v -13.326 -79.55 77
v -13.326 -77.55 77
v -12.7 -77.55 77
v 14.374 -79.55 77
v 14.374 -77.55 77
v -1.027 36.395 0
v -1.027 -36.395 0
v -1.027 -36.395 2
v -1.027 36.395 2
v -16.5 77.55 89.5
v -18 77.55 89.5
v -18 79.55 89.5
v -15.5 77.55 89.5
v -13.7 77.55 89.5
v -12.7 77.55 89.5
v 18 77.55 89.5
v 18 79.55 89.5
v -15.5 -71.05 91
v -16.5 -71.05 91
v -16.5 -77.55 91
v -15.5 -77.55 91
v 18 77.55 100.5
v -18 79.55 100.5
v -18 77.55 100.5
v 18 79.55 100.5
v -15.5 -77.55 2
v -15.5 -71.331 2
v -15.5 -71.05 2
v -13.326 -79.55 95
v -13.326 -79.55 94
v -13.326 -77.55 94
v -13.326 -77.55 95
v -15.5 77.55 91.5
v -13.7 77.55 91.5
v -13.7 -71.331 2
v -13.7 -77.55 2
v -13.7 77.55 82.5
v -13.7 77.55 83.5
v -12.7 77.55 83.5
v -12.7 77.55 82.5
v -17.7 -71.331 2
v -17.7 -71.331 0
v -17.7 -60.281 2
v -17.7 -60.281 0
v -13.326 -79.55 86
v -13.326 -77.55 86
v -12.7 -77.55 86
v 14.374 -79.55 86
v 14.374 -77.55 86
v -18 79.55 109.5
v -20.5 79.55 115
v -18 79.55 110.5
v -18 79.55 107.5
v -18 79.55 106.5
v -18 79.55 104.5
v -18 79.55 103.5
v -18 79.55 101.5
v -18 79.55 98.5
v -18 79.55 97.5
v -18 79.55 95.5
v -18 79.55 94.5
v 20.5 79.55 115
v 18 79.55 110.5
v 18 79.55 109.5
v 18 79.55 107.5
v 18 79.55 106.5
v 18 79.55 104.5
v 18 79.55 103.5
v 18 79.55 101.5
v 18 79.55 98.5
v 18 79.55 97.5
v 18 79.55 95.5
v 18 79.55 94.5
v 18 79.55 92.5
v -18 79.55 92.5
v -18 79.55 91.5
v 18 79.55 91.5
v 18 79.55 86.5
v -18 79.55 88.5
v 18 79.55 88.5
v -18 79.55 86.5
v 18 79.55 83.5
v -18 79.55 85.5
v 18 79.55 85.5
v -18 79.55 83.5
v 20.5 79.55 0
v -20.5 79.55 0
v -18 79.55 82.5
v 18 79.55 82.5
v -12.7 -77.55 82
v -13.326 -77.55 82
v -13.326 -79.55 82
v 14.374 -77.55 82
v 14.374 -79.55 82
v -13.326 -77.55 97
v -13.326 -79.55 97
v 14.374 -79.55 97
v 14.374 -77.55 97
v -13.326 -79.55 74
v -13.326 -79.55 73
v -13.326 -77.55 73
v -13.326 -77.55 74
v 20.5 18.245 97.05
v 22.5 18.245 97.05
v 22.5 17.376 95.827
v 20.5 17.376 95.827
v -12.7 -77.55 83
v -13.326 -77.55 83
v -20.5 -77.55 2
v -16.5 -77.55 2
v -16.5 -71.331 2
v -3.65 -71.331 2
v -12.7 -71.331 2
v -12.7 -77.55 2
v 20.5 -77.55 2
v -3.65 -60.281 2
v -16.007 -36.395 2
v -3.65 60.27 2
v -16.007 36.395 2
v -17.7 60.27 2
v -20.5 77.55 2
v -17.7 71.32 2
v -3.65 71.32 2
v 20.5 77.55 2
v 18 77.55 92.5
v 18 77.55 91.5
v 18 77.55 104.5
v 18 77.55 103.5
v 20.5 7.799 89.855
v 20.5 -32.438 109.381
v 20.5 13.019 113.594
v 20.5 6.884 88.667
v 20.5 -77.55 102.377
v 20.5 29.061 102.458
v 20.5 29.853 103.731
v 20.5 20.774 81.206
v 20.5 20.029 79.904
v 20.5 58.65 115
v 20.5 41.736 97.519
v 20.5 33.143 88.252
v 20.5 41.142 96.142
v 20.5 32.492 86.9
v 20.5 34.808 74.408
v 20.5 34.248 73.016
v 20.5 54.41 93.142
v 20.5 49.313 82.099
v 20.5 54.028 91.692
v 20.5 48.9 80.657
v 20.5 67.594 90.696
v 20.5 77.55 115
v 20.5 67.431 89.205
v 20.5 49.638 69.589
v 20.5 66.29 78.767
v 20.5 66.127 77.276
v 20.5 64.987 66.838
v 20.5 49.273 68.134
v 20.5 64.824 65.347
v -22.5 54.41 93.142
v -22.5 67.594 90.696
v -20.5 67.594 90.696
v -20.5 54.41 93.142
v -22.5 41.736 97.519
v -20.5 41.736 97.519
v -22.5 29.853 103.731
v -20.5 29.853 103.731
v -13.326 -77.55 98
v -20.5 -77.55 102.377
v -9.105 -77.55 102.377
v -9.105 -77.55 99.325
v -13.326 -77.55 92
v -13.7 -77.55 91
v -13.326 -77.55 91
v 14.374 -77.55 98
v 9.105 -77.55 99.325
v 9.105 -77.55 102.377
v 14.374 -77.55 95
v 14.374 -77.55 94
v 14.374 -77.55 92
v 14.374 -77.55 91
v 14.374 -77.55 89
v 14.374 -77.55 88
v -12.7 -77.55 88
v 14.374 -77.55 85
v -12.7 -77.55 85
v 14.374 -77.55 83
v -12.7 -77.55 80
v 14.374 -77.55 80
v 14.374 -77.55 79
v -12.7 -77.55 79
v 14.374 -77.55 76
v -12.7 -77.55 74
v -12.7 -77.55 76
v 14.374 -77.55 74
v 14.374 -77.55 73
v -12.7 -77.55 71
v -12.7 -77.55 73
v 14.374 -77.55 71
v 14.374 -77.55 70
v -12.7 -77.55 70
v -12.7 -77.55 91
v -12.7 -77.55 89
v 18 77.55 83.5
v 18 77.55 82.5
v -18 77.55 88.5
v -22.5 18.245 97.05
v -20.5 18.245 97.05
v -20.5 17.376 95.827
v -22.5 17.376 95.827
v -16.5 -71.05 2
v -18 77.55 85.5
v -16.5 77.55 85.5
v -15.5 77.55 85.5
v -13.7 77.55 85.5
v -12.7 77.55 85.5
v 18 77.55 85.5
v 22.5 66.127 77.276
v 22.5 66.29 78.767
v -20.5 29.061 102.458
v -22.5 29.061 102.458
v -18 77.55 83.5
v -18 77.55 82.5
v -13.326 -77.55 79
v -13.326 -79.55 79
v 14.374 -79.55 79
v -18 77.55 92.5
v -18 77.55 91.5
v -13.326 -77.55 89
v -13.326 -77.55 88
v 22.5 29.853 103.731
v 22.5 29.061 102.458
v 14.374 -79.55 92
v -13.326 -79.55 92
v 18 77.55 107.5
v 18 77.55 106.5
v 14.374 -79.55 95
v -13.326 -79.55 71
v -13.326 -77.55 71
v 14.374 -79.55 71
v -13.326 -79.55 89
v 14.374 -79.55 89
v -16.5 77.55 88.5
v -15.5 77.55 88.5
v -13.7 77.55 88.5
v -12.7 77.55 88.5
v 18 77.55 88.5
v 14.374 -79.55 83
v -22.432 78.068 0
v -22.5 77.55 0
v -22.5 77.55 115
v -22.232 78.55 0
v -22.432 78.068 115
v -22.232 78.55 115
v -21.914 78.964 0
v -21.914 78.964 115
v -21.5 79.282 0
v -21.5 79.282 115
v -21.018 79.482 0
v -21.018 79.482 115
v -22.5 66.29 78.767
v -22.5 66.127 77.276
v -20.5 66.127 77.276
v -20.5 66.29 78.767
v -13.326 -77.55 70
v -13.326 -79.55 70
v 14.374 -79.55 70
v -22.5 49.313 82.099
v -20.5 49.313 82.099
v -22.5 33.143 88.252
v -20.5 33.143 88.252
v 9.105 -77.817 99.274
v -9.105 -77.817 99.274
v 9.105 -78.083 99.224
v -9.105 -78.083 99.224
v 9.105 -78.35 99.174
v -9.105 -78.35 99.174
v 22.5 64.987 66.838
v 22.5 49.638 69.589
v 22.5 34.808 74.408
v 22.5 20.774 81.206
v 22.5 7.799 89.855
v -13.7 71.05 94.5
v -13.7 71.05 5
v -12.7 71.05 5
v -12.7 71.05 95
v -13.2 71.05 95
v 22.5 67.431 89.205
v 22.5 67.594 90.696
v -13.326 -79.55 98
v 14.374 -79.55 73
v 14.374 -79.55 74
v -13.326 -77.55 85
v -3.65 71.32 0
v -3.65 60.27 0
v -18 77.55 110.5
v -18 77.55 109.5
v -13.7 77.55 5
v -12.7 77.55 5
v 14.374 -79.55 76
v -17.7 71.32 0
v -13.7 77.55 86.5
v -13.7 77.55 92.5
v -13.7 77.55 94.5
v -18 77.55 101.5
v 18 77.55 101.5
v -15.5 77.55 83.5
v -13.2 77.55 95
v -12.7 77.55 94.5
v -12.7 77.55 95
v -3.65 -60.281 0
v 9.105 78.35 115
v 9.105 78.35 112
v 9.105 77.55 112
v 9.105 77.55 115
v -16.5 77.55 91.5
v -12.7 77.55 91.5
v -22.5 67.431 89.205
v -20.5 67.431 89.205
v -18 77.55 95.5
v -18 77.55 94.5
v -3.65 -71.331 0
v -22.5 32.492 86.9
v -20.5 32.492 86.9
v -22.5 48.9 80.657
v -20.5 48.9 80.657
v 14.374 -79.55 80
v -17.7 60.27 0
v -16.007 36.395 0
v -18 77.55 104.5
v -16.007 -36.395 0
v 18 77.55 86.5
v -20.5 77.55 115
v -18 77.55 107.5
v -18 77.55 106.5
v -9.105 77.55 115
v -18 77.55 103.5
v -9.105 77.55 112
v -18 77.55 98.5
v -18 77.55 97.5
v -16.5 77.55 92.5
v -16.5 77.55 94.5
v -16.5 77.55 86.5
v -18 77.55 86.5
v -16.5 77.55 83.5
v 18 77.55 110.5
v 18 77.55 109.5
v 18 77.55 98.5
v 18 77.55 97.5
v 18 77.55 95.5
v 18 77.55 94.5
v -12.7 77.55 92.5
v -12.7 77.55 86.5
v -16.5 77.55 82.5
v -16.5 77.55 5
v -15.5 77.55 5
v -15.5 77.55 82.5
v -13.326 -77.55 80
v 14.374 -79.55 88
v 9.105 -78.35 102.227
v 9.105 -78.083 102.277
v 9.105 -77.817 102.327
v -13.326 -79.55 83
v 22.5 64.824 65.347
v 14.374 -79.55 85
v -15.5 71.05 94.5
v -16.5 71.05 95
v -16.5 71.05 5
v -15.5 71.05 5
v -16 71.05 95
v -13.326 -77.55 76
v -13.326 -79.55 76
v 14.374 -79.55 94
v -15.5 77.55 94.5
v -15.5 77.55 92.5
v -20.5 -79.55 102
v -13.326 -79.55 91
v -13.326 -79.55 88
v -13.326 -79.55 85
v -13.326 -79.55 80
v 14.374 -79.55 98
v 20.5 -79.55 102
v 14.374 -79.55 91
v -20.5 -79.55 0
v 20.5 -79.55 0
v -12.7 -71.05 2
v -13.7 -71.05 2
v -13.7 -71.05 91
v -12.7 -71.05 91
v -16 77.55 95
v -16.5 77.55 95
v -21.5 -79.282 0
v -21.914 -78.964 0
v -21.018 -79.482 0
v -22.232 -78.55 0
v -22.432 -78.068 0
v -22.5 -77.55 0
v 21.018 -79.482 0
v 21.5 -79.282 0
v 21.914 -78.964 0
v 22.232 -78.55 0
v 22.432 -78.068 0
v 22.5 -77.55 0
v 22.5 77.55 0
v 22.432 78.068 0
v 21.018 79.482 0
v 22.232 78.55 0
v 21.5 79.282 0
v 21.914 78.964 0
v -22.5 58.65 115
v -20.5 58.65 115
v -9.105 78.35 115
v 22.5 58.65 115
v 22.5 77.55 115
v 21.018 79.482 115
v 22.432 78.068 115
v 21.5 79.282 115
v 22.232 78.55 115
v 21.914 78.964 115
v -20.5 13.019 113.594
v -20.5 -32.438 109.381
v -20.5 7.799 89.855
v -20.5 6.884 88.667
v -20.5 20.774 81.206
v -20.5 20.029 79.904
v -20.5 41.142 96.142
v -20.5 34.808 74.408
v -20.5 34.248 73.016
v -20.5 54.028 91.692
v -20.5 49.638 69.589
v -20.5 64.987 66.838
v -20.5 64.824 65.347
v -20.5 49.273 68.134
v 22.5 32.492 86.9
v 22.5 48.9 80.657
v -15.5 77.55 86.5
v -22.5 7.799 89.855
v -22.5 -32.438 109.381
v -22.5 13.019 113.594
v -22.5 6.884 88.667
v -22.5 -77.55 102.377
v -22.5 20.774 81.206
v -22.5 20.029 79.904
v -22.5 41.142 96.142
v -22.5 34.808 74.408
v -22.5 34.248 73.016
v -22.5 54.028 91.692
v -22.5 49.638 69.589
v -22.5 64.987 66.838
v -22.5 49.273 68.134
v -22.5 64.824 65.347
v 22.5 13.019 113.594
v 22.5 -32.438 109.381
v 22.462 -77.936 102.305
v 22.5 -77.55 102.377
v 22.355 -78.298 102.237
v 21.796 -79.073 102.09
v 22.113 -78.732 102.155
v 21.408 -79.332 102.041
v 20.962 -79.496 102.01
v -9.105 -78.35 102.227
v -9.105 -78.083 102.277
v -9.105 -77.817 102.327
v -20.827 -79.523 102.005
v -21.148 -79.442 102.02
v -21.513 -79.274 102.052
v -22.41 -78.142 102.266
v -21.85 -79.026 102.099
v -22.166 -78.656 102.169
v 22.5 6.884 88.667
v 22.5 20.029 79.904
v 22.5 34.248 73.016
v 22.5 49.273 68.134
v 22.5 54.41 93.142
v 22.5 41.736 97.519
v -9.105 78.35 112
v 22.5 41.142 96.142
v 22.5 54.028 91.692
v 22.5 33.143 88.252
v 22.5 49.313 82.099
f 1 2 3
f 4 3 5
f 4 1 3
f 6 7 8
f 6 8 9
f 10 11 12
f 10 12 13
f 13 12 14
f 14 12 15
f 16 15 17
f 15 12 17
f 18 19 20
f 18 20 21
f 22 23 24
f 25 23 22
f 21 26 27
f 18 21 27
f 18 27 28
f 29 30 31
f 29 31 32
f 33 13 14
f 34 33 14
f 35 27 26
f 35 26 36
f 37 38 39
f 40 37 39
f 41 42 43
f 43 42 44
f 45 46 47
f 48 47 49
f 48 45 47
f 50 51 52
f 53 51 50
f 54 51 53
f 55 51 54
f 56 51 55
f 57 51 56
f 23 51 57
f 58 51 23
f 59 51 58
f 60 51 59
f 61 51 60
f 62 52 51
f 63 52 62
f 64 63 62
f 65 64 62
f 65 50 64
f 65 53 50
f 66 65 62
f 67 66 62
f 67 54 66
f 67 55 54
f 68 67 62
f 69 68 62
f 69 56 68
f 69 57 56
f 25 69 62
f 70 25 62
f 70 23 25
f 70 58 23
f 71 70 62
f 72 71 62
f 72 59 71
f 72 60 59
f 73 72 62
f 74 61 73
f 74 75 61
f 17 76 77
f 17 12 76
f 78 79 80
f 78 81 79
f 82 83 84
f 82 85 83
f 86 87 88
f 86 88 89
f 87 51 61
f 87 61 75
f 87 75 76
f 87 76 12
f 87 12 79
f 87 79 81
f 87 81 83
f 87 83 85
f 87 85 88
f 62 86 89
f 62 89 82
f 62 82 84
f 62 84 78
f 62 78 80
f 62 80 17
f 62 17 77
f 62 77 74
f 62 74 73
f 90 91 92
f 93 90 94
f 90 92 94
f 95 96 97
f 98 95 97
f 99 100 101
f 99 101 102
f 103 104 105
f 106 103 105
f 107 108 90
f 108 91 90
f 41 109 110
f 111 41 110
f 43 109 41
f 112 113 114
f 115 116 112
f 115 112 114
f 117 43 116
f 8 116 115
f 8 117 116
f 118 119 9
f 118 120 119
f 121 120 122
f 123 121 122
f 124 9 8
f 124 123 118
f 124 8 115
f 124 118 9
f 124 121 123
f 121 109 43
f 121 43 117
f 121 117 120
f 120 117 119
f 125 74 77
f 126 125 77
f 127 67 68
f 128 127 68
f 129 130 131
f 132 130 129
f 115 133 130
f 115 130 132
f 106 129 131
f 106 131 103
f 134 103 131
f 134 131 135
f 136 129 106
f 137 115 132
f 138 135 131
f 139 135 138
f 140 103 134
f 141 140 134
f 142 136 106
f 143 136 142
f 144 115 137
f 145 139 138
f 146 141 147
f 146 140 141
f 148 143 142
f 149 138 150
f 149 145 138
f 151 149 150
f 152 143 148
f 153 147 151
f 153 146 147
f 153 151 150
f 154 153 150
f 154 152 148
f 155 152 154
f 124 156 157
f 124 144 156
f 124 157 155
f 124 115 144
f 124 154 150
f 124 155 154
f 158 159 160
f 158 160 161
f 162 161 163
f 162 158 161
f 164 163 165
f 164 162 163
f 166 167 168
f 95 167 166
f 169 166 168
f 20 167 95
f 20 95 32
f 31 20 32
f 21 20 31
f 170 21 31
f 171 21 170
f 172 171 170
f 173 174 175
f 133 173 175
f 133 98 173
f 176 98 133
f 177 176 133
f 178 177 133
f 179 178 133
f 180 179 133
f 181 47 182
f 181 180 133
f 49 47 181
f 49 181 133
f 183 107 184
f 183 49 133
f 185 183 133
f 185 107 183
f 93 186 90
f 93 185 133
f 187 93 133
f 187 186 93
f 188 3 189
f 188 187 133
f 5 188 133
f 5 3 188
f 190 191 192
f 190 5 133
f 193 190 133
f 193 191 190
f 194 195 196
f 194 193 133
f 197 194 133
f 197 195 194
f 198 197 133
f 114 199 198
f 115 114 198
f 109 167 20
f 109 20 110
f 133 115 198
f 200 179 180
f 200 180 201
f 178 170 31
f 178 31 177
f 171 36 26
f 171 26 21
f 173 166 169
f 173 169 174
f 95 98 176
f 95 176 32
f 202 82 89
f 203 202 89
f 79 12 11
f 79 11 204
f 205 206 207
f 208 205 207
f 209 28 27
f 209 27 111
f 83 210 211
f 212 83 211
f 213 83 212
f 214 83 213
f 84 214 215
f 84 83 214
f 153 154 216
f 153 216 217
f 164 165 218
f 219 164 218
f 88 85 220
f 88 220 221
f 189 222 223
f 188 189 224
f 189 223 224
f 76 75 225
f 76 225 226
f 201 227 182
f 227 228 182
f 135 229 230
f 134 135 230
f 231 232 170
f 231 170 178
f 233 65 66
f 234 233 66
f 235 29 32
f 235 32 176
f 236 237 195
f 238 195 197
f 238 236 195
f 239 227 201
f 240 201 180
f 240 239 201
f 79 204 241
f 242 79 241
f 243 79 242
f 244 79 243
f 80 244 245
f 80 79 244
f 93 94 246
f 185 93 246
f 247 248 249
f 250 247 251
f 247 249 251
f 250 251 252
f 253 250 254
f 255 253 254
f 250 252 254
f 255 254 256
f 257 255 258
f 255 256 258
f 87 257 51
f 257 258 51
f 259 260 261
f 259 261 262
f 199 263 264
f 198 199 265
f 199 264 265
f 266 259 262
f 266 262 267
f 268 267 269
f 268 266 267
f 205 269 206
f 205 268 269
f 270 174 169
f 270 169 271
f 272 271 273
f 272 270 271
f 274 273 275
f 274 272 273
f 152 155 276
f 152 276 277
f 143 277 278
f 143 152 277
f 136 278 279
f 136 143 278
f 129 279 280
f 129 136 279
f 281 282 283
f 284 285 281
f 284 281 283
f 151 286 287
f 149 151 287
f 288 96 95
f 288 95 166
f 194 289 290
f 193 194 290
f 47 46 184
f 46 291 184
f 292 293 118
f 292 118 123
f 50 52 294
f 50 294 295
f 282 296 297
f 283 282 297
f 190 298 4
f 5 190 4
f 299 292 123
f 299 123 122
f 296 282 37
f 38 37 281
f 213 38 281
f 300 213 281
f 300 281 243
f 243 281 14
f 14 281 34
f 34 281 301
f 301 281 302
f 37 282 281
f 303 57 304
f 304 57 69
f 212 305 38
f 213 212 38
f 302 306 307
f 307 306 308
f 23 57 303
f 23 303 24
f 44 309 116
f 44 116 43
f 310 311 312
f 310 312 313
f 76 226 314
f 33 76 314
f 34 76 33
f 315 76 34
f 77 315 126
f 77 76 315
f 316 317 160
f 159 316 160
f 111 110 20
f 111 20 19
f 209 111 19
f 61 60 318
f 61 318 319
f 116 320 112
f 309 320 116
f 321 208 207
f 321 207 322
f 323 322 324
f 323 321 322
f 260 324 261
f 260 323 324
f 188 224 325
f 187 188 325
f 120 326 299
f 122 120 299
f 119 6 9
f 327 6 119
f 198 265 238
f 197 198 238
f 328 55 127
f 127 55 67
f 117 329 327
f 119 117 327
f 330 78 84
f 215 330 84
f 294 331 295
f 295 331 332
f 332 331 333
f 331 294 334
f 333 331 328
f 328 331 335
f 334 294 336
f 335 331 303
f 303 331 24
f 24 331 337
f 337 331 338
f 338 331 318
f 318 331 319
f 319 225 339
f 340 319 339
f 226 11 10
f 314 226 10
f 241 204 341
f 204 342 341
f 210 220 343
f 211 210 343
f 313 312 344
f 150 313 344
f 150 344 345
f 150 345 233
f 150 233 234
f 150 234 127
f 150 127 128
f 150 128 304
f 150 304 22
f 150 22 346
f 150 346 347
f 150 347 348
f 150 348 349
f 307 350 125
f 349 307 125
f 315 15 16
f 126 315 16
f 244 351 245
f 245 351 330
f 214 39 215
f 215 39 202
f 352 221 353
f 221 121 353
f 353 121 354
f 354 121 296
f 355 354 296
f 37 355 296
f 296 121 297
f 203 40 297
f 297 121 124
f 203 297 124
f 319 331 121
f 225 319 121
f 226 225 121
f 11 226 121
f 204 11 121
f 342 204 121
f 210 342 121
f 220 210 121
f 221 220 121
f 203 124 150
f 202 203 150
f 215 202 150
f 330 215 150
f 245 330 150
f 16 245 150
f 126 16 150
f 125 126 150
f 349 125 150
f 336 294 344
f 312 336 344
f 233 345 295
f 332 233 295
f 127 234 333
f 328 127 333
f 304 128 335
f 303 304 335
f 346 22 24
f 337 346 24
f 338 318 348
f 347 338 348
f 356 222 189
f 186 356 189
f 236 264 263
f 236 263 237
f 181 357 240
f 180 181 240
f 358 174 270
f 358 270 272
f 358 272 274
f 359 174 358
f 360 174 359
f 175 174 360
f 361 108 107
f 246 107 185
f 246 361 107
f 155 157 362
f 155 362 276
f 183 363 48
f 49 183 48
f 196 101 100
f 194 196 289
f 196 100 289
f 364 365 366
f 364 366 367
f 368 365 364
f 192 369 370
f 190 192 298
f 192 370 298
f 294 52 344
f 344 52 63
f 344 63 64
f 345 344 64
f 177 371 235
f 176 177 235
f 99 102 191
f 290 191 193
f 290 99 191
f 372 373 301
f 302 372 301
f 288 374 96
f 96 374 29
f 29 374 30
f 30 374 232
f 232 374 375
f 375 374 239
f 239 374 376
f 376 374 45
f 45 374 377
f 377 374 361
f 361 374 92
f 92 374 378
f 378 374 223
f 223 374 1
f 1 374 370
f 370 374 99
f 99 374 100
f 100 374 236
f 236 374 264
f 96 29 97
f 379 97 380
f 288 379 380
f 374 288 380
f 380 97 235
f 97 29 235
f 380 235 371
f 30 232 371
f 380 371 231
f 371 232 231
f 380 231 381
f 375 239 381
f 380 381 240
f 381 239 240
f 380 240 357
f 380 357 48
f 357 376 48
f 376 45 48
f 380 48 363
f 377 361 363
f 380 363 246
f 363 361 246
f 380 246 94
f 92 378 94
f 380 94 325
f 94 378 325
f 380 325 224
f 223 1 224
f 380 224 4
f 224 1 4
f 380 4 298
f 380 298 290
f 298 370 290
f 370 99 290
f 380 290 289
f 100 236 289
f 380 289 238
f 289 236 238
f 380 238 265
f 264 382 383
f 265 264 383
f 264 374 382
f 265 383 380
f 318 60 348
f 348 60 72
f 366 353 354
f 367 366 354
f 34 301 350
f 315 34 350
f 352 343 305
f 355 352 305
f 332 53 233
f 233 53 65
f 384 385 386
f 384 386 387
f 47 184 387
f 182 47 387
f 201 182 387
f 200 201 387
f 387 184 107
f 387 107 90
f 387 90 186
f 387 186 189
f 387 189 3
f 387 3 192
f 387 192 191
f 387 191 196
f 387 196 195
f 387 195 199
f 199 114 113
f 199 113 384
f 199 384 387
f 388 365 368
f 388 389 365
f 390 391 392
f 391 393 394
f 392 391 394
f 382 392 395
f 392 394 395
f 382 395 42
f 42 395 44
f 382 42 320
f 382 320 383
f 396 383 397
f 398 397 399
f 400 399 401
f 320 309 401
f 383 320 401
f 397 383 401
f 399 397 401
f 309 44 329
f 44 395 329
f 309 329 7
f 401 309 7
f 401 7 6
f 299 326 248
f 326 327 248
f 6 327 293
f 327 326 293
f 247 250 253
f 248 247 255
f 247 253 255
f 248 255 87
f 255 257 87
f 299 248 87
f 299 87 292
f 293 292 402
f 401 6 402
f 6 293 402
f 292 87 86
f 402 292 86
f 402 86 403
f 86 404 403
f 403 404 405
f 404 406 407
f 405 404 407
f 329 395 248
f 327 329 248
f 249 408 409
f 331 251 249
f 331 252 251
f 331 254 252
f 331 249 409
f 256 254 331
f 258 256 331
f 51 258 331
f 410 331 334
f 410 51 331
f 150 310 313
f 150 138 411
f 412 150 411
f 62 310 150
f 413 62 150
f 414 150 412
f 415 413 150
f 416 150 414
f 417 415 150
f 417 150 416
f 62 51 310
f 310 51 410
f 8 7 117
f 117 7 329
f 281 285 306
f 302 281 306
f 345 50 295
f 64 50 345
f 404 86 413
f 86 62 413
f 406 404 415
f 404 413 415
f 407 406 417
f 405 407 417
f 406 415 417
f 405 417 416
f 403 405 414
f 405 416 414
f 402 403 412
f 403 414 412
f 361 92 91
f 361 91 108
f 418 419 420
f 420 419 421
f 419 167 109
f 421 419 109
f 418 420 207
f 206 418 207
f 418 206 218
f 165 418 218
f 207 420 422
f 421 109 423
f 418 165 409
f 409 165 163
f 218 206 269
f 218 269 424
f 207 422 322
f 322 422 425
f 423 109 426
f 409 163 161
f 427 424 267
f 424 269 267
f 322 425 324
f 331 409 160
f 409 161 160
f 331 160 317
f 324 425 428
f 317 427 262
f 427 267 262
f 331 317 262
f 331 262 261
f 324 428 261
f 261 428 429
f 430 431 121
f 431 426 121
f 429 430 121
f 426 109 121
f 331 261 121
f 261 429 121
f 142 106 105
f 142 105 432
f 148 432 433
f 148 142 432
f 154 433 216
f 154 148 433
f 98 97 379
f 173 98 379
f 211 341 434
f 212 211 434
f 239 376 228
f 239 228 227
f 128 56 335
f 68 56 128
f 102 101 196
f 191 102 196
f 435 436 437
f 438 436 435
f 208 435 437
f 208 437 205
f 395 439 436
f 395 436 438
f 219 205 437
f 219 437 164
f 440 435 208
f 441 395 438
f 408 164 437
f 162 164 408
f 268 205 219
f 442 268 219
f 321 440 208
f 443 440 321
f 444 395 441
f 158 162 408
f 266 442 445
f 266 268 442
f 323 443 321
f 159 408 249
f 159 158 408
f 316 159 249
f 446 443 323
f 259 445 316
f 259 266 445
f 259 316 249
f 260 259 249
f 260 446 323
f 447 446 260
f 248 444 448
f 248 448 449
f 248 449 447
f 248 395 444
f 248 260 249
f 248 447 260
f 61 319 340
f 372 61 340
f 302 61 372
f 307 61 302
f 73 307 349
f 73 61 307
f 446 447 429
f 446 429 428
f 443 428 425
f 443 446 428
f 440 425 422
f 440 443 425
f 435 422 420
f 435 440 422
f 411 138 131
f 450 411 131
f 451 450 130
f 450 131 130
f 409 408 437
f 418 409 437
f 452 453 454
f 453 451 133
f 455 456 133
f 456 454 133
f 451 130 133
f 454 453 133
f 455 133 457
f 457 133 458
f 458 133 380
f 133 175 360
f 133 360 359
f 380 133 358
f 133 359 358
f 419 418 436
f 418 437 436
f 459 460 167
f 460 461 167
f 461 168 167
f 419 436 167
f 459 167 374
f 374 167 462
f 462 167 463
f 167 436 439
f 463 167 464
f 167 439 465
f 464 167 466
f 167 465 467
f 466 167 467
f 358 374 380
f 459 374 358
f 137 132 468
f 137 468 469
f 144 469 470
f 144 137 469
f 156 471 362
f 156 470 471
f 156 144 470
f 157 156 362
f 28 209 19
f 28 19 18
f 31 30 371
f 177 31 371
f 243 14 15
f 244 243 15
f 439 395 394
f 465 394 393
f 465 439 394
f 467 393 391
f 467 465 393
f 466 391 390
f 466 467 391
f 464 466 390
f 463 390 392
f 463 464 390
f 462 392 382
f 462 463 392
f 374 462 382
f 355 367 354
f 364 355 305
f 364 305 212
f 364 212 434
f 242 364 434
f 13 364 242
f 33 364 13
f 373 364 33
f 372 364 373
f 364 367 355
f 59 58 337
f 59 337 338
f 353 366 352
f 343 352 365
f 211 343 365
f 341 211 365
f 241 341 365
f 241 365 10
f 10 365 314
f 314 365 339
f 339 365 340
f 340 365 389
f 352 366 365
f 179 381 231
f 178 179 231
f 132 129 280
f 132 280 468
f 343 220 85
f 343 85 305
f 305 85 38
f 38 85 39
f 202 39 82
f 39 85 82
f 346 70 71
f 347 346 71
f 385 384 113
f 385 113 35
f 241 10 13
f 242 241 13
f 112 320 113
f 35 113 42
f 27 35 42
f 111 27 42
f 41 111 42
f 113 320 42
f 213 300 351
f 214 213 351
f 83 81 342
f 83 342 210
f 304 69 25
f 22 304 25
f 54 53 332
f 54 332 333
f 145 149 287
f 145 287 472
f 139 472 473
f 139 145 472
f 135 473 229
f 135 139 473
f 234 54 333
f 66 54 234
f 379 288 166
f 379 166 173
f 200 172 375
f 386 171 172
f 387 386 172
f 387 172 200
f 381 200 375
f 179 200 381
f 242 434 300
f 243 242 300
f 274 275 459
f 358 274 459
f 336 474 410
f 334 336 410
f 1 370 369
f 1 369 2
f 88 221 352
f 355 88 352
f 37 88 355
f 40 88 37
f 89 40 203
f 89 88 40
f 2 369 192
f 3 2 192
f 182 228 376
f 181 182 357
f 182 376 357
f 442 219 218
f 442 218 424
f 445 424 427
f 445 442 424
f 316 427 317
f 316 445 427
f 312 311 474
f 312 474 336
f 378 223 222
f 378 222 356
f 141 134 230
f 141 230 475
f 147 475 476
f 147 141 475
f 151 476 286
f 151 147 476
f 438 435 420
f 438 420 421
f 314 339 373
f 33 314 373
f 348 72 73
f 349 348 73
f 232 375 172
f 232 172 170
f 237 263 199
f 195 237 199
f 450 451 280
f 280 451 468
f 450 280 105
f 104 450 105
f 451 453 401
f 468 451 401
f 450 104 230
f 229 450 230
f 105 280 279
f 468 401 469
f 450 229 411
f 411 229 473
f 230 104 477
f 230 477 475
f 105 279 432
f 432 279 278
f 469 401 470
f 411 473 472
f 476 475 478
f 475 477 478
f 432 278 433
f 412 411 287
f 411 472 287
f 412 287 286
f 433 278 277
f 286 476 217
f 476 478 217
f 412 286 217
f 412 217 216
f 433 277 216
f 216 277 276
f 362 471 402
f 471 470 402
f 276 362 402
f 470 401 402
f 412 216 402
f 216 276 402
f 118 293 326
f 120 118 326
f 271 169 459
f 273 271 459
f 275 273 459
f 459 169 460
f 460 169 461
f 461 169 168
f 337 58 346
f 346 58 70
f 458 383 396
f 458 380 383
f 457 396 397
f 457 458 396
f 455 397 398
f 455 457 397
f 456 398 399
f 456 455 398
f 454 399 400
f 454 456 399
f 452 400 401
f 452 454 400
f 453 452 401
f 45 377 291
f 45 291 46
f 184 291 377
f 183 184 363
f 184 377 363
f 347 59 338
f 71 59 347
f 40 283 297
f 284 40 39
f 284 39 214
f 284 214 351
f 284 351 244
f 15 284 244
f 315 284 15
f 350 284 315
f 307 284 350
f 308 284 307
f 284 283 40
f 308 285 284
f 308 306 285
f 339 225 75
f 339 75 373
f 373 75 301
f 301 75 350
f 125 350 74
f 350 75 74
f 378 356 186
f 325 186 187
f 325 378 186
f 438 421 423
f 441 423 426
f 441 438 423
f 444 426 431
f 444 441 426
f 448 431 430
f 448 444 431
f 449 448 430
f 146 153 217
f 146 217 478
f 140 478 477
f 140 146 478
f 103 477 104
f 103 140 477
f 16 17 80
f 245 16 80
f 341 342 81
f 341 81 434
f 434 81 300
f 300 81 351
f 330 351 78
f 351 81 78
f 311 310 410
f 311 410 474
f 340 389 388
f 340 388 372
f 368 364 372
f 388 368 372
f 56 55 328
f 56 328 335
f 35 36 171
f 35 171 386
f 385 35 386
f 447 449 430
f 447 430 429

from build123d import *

# Parameters (mm, degrees)
SKETCH1_W               = 45
SKETCH1_H               = 159.1
BOSS_EXTRUDE1_DEPTH     = 115
SHELL1_T                = -2
CUT_EXTRUDE1_DEPTH      = 147.895209248
CUT_EXTRUDE1_DEPTH_BACK = 147.895209248
FILLET1_R               = 2
SKETCH3_W               = 36
SKETCH3_H               = 1
CUT_EXTRUDE2_DEPTH      = 4
LPATTERN1_COUNT         = 10
LPATTERN1_PITCH         = 3
SKETCH8_W               = 27.700077209
SKETCH8_H               = 1
CUT_EXTRUDE4_DEPTH      = 5
LPATTERN2_COUNT         = 10
LPATTERN2_PITCH         = 3
CUT_EXTRUDE3_DEPTH      = 147.895209411
SKETCH7_W               = 1
SKETCH7_H               = 6.5
BOSS_EXTRUDE3_DEPTH     = 90
CHAMFER2_SIZE           = 0.5
CUT_EXTRUDE6_DEPTH      = 9.105
SKETCH11_W              = 1
SKETCH11_H              = 6.5
BOSS_EXTRUDE6_DEPTH     = 89
SKETCH12_W              = 14.9796
SKETCH12_H              = 72.79
SKETCH12_W_2            = 14.049996967
SKETCH12_H_2            = 11.05
CUT_EXTRUDE7_DEPTH      = 2


with BuildPart() as part:
    # Sketch1 → Boss-Extrude1 (new body)
    with BuildSketch(Plane.XY):
        Rectangle(SKETCH1_W, SKETCH1_H)
    extrude(amount=BOSS_EXTRUDE1_DEPTH)

    # Shell1
    shell1_openings = [part.faces().sort_by_distance(p)[0] for p in [
        (0, 0, 115),
    ]]
    offset(amount=SHELL1_T, openings=shell1_openings, kind=Kind.INTERSECTION)

    # Sketch2 → Cut-Extrude1 (cut, two sides: drawn at the far end of the back side and taken through both)
    with BuildSketch(Plane(origin=(22.5, 0, 0), x_dir=(0, 0, -1), z_dir=(1, 0, 0)).offset(-CUT_EXTRUDE1_DEPTH_BACK)):
        with BuildLine():
            Line((-115, 482.170987722), (-115, 79.55))
            Line((-115, 79.55), (-115, 58.65))
            ThreePointArc((-115, 58.65), (-111.742842211, -10.755043044), (-102, -79.55))
            Line((-102, -79.55), (-26.918013628, -475.108282781))
            Line((-26.918013628, -475.108282781), (-828.772746701, -548.88921573))
            Line((-828.772746701, -548.88921573), (-916.854733073, 408.390054773))
            Line((-916.854733073, 408.390054773), (-115, 482.170987722))
        make_face()
    extrude(amount=CUT_EXTRUDE1_DEPTH + CUT_EXTRUDE1_DEPTH_BACK, mode=Mode.SUBTRACT)

    # Fillet1
    fillet1_edges = [part.edges().sort_by_distance(p)[0] for p in [
        (22.5, -79.55, 51),
        (-22.5, -79.55, 51),
        (-22.5, 79.55, 57.5),
        (22.5, 79.55, 57.5),
    ]]
    fillet(fillet1_edges, radius=FILLET1_R)

    # Sketch3 → Cut-Extrude2 (cut)
    with BuildSketch(Plane(origin=(0, 79.55, 0), x_dir=(1, 0, 0), z_dir=(0, 1, 0))):
        with Locations((0, -110)):
            Rectangle(SKETCH3_W, SKETCH3_H)
    cut_extrude2 = extrude(amount=-CUT_EXTRUDE2_DEPTH, mode=Mode.SUBTRACT)

    # LPattern1: Cut-Extrude2 ×10
    with Locations(*[(0, 0, -i * LPATTERN1_PITCH) for i in range(1, LPATTERN1_COUNT)]):
        add(cut_extrude2, mode=Mode.SUBTRACT)

    # Sketch8 → Cut-Extrude4 (cut)
    with BuildSketch(Plane.XZ.offset(79.55)):
        with Locations((0.524208986, 97.5)):
            Rectangle(SKETCH8_W, SKETCH8_H)
    cut_extrude4 = extrude(amount=-CUT_EXTRUDE4_DEPTH, mode=Mode.SUBTRACT)

    # LPattern2: Cut-Extrude4 ×10
    with Locations(*[(0, 0, -i * LPATTERN2_PITCH) for i in range(1, LPATTERN2_COUNT)]):
        add(cut_extrude4, mode=Mode.SUBTRACT)

    # Sketch5 → Cut-Extrude3 (cut, through all)
    with BuildSketch(Plane.ZY.offset(22.5)):
        with BuildLine():
            Line((65.347036406, 64.823533738), (66.838155653, 64.986516539))
            ThreePointArc((66.838155653, 64.986516539), (74.40797048, 34.807641847), (89.855449244, 7.799458383))
            Line((89.855449244, 7.799458383), (88.667189124, 6.88401429))
            ThreePointArc((88.667189124, 6.88401429), (73.01645406, 34.24756859), (65.347036406, 64.823533738))
        make_face()
        with BuildLine():
            Line((77.275990376, 66.127396149), (78.767109622, 66.29037895))
            ThreePointArc((78.767109622, 66.29037895), (84.83196797, 41.097147113), (97.049571899, 18.245197712))
            Line((97.049571899, 18.245197712), (95.827312392, 17.375668128))
            ThreePointArc((95.827312392, 17.375668128), (83.430037817, 40.563675608), (77.275990376, 66.127396149))
        make_face()
        with BuildLine():
            Line((89.204944346, 67.431258559), (90.696063592, 67.594241361))
            ThreePointArc((90.696063592, 67.594241361), (95.094328846, 47.99151385), (103.7314578, 29.852835107))
            Line((103.7314578, 29.852835107), (102.457595124, 29.060828868))
            ThreePointArc((102.457595124, 29.060828868), (93.67651402, 47.501818923), (89.204944346, 67.431258559))
        make_face()
    extrude(amount=-CUT_EXTRUDE3_DEPTH, mode=Mode.SUBTRACT)

    # Sketch7 → Boss-Extrude3 (add)
    with BuildSketch(Plane.XY.offset(95)):
        with Locations((-16, 74.3)):
            Rectangle(SKETCH7_W, SKETCH7_H)
        with Locations((-13.2, 74.3)):
            Rectangle(SKETCH7_W, SKETCH7_H)
    extrude(amount=-BOSS_EXTRUDE3_DEPTH)

    # Chamfer2
    chamfer2_edges = [part.edges().sort_by_distance(p)[0] for p in [
        (-13.7, 74.3, 95),
        (-15.5, 74.3, 95),
    ]]
    chamfer(chamfer2_edges, length=CHAMFER2_SIZE)

    # Sketch10 → Cut-Extrude6 (cut, symmetric)
    with BuildSketch(Plane(origin=(0, 0, 0), x_dir=(0, 0, -1), z_dir=(1, 0, 0))):
        with BuildLine():
            Line((-131.709183252, 78.35), (-112, 78.35))
            Line((-112, 78.35), (-112, 58.65))
            ThreePointArc((-112, 58.65), (-108.78648369, -10.149542881), (-99.173917094, -78.35))
            Line((-99.173917094, -78.35), (-102.923842912, -78.35))
            Line((-102.923842912, -78.35), (-131.709183252, 78.35))
        make_face()
    extrude(amount=CUT_EXTRUDE6_DEPTH, both=True, mode=Mode.SUBTRACT)

    # Sketch11 → Boss-Extrude6 (add)
    with BuildSketch(Plane.XY.offset(2)):
        with Locations((-16, -74.3)):
            Rectangle(SKETCH11_W, SKETCH11_H)
        with Locations((-13.2, -74.3)):
            Rectangle(SKETCH11_W, SKETCH11_H)
    extrude(amount=BOSS_EXTRUDE6_DEPTH)

    # Sketch12 → Cut-Extrude7 (cut)
    with BuildSketch(Plane(origin=(0, 0, 0), x_dir=(-1, 0, 0), z_dir=(0, 0, -1))):
        with Locations((8.5168, 0)):
            Rectangle(SKETCH12_W, SKETCH12_H)
        with Locations((10.674998484, -65.806322554)):
            Rectangle(SKETCH12_W_2, SKETCH12_H_2)
        with Locations((10.674998484, 65.795)):
            Rectangle(SKETCH12_W_2, SKETCH12_H_2)
    extrude(amount=-CUT_EXTRUDE7_DEPTH, mode=Mode.SUBTRACT)


solid = part.part
